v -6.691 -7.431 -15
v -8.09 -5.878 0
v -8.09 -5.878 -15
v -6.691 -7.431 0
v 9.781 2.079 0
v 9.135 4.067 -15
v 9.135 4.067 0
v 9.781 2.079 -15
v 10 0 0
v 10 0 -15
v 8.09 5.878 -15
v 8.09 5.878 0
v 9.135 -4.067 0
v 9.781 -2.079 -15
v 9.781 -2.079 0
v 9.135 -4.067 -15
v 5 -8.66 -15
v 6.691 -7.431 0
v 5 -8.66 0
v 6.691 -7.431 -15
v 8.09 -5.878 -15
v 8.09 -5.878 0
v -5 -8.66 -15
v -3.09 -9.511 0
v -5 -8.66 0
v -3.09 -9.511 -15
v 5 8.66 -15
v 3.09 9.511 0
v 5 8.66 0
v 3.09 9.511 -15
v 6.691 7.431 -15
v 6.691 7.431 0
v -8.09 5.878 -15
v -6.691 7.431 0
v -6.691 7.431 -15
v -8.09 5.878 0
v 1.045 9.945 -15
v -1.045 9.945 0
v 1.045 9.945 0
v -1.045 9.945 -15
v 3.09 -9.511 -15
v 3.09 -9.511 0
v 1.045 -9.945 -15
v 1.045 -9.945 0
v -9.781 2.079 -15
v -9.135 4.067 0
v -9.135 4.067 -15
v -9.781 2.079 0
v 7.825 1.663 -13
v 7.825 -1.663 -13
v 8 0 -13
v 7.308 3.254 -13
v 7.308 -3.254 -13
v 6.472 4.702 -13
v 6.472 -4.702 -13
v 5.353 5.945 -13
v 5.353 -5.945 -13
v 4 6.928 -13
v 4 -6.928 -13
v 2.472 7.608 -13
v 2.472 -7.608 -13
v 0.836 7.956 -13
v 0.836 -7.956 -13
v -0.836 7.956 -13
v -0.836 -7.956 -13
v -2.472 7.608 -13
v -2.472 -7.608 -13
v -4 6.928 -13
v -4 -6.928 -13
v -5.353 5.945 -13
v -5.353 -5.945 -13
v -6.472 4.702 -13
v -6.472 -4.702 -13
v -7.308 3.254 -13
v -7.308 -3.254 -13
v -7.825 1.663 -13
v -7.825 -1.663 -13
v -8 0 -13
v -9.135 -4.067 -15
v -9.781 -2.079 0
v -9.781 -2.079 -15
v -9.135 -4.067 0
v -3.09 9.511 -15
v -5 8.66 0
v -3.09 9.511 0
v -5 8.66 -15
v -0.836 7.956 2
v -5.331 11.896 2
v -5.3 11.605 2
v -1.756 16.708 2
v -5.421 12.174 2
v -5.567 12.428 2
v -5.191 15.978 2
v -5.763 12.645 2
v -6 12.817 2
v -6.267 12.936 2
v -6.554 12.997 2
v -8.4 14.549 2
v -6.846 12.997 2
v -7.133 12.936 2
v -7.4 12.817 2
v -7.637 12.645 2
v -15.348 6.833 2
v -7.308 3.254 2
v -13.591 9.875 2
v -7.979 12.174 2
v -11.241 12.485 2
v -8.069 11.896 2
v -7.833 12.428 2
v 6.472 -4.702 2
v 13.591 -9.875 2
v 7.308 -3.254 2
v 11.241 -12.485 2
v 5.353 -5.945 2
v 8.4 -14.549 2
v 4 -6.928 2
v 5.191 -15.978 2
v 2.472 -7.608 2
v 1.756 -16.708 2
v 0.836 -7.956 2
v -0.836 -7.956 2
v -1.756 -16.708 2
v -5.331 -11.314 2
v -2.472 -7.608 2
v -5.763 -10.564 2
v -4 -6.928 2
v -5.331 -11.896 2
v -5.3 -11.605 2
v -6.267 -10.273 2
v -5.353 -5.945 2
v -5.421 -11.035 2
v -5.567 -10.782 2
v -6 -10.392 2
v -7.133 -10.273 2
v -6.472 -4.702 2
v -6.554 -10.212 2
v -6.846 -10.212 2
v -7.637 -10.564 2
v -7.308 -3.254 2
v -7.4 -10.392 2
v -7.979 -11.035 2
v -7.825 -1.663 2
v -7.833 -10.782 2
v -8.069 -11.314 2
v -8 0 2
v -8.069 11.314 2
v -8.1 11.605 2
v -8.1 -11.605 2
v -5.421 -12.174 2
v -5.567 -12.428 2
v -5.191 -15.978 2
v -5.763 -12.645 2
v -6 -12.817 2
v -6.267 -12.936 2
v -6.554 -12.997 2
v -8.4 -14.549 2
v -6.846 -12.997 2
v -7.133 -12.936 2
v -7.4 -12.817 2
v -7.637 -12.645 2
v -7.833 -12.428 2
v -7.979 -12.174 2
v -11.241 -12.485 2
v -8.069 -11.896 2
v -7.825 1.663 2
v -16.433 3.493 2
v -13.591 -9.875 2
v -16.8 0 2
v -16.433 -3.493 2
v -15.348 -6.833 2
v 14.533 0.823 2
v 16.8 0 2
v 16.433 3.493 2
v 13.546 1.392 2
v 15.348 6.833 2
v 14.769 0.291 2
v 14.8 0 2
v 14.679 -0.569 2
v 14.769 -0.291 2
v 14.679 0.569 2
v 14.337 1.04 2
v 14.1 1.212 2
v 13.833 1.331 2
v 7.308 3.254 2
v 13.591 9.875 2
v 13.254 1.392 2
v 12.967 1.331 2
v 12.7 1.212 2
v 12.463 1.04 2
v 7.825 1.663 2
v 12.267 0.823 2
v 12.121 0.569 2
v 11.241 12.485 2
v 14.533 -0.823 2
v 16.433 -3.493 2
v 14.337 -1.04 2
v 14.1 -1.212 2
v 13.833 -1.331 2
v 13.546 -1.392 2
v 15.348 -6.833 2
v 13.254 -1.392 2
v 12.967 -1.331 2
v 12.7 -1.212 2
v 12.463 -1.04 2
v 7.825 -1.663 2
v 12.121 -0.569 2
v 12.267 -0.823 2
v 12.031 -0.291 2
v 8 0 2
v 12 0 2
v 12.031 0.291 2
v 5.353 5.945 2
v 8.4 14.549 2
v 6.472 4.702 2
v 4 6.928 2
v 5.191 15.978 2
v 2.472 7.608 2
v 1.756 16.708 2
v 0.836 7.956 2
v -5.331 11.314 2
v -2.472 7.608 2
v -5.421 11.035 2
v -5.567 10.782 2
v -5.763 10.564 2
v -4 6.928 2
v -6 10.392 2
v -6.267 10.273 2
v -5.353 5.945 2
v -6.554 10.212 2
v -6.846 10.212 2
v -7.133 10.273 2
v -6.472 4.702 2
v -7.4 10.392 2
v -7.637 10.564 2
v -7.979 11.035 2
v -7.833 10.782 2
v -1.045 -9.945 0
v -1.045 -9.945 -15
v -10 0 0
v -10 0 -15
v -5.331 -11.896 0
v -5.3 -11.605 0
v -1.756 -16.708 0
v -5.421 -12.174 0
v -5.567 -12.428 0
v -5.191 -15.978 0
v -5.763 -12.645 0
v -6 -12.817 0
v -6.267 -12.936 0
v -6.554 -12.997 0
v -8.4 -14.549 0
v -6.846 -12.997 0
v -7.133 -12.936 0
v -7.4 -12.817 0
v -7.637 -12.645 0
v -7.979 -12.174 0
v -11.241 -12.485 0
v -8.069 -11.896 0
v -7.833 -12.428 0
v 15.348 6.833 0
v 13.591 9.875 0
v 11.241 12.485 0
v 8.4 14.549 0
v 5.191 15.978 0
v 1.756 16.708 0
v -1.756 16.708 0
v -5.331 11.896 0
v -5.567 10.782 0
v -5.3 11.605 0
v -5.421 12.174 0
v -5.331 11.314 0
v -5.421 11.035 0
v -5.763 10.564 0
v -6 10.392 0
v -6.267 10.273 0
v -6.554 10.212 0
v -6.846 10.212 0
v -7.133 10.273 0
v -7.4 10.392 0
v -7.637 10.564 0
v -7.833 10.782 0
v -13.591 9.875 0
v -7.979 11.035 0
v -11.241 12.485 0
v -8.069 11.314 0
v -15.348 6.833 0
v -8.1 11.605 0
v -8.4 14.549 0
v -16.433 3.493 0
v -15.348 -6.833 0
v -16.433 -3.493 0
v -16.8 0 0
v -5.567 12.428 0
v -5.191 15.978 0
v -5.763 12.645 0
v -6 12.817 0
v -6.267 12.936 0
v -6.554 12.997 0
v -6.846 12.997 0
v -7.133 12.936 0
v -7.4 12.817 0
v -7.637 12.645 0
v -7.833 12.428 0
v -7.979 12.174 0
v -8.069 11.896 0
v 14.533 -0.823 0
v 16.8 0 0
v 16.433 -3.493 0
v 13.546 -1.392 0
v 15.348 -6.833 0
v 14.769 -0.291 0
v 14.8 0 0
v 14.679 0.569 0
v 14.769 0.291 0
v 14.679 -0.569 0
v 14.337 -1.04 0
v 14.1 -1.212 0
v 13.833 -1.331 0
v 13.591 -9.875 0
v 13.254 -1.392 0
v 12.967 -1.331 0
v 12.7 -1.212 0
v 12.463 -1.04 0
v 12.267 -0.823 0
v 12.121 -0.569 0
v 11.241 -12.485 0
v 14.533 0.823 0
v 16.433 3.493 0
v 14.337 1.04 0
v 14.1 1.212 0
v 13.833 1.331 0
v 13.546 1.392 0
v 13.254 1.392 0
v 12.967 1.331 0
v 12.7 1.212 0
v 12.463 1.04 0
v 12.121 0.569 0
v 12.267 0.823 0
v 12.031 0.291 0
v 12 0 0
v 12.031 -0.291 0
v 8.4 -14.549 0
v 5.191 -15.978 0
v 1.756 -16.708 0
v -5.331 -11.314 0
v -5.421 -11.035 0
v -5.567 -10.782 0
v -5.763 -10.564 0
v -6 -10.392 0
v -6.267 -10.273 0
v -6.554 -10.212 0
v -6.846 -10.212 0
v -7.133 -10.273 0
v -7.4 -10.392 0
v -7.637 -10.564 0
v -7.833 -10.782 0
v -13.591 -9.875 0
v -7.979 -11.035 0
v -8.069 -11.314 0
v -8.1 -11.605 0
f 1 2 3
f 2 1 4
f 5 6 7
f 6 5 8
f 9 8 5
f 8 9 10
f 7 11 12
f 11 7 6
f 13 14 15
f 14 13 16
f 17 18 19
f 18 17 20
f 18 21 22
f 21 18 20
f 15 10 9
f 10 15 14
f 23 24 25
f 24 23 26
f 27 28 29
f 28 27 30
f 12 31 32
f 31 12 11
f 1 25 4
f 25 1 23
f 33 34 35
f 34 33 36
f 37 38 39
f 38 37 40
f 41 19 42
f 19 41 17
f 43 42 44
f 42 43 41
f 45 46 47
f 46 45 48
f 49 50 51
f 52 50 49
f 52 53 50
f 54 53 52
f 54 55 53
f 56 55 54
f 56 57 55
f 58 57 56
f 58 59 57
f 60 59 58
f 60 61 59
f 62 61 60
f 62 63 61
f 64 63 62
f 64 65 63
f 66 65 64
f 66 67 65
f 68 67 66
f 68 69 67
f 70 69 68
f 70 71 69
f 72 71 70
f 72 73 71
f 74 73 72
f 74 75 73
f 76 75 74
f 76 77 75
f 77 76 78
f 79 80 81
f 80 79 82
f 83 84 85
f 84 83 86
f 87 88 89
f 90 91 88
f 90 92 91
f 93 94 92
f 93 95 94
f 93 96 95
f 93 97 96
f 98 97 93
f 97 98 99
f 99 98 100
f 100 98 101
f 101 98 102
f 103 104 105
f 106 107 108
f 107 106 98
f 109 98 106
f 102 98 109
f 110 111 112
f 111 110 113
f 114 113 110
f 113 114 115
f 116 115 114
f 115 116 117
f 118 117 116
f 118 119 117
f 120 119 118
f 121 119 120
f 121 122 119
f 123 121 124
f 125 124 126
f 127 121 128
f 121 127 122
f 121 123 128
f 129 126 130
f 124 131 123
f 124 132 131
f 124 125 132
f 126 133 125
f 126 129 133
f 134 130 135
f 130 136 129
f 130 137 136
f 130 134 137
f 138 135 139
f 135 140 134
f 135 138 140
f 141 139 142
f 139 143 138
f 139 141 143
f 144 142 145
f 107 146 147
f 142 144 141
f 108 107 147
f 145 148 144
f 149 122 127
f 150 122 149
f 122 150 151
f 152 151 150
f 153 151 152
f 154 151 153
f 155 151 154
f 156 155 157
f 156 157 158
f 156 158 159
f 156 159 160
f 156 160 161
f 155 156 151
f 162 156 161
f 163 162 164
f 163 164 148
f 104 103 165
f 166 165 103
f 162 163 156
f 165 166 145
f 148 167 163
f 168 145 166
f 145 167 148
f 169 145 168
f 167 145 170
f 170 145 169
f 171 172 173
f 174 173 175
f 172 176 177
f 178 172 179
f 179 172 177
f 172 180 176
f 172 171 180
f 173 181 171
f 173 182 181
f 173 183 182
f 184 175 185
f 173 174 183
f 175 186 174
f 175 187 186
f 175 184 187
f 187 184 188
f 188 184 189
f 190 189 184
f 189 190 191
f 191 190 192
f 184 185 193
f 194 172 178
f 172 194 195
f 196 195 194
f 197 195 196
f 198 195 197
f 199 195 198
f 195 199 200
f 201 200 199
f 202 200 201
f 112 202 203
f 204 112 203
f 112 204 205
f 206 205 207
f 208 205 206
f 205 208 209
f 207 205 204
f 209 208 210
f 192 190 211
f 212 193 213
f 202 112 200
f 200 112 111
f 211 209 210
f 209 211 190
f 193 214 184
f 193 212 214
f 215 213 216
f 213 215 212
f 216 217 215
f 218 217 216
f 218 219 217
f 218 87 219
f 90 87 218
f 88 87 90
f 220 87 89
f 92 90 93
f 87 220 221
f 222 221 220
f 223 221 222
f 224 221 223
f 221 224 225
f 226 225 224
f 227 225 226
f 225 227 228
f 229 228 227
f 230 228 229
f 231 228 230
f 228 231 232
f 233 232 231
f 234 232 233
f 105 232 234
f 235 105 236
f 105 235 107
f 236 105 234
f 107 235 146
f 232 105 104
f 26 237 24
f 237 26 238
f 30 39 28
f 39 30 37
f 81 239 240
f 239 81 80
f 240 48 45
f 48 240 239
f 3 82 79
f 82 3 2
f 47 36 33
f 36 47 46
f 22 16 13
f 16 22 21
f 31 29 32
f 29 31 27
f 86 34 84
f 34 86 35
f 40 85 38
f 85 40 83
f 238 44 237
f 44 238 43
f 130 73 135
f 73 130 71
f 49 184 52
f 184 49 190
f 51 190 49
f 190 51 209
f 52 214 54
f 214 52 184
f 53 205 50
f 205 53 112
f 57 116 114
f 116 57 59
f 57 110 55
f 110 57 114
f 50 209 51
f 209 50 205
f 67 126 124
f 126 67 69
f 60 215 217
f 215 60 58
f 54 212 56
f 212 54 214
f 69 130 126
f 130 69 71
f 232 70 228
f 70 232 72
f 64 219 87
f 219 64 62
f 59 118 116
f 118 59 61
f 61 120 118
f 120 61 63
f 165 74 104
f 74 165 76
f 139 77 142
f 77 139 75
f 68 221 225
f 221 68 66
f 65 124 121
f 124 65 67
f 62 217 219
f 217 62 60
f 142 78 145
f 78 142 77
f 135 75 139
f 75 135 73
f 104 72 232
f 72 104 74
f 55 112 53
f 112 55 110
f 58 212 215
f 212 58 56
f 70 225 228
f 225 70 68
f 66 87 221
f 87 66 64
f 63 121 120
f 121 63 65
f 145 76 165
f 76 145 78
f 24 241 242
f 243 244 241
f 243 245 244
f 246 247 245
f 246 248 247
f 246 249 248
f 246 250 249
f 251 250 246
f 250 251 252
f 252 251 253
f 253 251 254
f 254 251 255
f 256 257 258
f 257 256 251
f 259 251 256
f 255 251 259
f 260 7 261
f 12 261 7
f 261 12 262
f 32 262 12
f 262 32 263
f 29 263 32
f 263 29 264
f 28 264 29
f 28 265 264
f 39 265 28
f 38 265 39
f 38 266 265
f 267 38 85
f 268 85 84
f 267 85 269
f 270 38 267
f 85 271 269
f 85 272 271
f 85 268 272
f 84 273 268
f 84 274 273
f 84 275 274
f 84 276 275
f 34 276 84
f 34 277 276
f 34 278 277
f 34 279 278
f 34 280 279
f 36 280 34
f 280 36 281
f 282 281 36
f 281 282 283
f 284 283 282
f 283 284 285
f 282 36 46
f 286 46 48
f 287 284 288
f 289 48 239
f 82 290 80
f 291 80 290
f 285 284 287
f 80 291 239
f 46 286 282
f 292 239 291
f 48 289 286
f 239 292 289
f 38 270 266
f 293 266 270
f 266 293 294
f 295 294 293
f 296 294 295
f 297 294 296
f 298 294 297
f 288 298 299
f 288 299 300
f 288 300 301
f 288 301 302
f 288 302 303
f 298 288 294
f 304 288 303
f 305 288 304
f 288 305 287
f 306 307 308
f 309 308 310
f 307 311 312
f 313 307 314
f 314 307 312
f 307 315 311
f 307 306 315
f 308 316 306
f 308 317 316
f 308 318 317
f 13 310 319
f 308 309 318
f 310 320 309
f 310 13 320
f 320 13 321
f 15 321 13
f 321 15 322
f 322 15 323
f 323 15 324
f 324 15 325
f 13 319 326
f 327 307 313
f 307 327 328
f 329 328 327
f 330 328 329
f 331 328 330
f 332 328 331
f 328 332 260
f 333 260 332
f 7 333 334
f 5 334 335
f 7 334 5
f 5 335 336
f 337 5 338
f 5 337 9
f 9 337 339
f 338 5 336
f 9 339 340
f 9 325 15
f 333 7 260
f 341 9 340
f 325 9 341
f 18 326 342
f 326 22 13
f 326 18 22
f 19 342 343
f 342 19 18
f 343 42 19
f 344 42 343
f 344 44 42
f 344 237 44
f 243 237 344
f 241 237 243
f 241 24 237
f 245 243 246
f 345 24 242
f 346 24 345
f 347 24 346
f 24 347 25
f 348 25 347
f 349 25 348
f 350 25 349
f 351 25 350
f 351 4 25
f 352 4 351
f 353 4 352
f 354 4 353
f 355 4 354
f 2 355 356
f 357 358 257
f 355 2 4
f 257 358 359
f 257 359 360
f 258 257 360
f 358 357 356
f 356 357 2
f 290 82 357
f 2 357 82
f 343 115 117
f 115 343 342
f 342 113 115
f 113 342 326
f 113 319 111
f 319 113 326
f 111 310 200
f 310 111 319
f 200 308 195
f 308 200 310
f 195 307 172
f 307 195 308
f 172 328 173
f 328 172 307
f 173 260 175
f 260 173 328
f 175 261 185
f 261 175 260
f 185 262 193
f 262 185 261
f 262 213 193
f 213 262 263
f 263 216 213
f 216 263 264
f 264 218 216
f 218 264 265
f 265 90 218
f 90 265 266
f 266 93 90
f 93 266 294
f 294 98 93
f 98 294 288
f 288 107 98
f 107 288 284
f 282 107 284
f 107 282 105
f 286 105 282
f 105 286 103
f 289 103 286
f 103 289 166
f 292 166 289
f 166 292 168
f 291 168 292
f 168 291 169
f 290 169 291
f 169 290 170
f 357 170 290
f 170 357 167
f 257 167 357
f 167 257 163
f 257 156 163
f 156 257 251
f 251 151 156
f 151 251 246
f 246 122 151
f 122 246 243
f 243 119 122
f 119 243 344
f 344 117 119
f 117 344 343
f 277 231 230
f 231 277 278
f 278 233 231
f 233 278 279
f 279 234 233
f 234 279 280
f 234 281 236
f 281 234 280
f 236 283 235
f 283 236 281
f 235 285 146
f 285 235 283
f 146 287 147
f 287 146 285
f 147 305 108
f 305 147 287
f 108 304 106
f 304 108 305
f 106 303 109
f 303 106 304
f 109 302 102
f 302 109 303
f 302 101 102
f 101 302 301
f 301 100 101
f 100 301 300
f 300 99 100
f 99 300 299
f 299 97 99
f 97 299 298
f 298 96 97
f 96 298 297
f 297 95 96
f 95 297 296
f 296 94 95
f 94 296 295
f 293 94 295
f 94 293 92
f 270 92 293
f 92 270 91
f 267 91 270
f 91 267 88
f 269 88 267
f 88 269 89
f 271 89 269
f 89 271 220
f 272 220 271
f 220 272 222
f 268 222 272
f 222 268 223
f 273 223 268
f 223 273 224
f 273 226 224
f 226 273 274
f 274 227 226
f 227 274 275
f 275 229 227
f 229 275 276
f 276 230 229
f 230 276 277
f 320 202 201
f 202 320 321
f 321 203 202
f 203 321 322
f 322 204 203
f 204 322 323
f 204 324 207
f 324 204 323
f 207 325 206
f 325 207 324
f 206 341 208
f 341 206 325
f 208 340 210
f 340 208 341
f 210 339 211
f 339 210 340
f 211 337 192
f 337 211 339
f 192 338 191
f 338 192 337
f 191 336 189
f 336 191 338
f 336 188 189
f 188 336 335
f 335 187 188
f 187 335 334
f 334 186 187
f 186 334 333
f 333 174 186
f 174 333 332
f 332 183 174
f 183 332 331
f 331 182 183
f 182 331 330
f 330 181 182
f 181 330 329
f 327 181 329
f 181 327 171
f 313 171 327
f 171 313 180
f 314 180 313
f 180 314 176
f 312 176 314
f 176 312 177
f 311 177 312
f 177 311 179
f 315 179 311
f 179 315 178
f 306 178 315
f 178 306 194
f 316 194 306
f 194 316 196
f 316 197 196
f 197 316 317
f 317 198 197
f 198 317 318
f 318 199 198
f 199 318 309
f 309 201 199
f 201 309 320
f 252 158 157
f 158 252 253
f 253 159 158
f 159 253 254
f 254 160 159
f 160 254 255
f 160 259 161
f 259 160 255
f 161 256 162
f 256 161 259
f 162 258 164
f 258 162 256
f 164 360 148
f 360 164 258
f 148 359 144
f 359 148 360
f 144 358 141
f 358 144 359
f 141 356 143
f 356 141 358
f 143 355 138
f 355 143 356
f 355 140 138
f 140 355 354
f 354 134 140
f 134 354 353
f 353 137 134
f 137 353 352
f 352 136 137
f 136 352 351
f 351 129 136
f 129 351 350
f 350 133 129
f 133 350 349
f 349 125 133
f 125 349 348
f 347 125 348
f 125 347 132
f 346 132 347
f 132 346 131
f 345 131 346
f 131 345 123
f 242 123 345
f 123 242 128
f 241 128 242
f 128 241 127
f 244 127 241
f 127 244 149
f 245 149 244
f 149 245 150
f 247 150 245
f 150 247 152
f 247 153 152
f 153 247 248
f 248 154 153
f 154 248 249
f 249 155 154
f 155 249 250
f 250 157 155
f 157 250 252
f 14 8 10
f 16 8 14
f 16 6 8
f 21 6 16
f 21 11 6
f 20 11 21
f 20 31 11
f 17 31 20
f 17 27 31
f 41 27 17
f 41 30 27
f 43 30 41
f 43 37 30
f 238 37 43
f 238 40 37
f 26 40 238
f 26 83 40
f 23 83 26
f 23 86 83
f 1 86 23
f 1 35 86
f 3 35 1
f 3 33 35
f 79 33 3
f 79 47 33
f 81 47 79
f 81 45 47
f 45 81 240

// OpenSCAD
// file: adapter_plate.scad
function screw_coords(d, r) = [cos(d)*r, sin(d)*r];
function calculate_outer_dia(inner_dia, spacing, screw_dia) = inner_dia + spacing*4 + screw_dia*2;

module adapter_plate(d=20, h=2, spacing=2, screw_dia=3,screw_num=3) {
    inner_dia = d;
    outer_dia = calculate_outer_dia(inner_dia, spacing, screw_dia);
    screw_angle = 360 / screw_num;
    screw_radius = inner_dia/2 + spacing + screw_dia/2;
    linear_extrude(h){
        difference() {
            circle(d=outer_dia, $fn=30);
            circle(d=inner_dia, $fn=30);
            if(screw_num > 0){
                for( i = [0 : screw_num-1] ){
                    translate(screw_coords(i*screw_angle, screw_radius)) circle(d=screw_dia, $fn=30);
                }
            }
        }
    }
}

module adapter_drill(d=20, h=20, spacing=2, screw_dia=3, screw_num=3, no_center=0) {
    inner_dia = d;
    outer_dia = calculate_outer_dia(inner_dia, spacing, screw_dia);
    screw_angle = 360 / screw_num;
    screw_radius = inner_dia/2 + spacing + screw_dia/2;
    linear_extrude(h) {
        if(no_center == 0){
            circle(d=inner_dia, $fn=30);
        }
        if(screw_num > 0){
            for( i = [0: screw_num-1] ){
                translate(screw_coords(i*screw_angle, screw_radius)) circle(d=screw_dia, $fn=30);
            }
        }
    }
}

d=6;
screw_num=2;
screw_dia=1.8;

//adapter_plate(d=d, screw_num=screw_num, screw_dia=screw_dia);
//adapter_drill(d=d, screw_num=screw_num, screw_dia=screw_dia);
adapter_plate();

// upper: screw_num=4, screw_dia=2.8, d=20
// bottom: screw_num=4, screw_dia=2.8, d=20
// side: screw_num=2, d=6, screw_dia=1.8
// main file
use <adapter_plate.scad>;

d=20;
h=2;
spacing=2;
screw_dia=2.8;
screw_num=3;

chamber_h = 15;
chamber_thick = 2;

union(){
    adapter_plate(d, h, spacing, screw_dia, screw_num);
    translate([0,0, -chamber_h + h])
        difference() {
            cylinder(h=chamber_h, d=d, $fn=30);
            translate([0,0,-1]) cylinder(h=chamber_h+2, d=d-chamber_thick*2, $fn=30);
        }
    translate([0,0,-chamber_h]) linear_extrude(chamber_thick) circle(d=d);
    /*translate([0,0, -chamber_h])
        difference() {
            cylinder(h=chamber_h, r=calculate_outer_dia(d, spacing, screw_dia)/2, $fn=30);
            translate([0,0,-1]) cylinder(h=chamber_h+2, r=d/2, $fn=30);
        };
    linear_extrude(chamber_thick) circle(d=10);*/
}
